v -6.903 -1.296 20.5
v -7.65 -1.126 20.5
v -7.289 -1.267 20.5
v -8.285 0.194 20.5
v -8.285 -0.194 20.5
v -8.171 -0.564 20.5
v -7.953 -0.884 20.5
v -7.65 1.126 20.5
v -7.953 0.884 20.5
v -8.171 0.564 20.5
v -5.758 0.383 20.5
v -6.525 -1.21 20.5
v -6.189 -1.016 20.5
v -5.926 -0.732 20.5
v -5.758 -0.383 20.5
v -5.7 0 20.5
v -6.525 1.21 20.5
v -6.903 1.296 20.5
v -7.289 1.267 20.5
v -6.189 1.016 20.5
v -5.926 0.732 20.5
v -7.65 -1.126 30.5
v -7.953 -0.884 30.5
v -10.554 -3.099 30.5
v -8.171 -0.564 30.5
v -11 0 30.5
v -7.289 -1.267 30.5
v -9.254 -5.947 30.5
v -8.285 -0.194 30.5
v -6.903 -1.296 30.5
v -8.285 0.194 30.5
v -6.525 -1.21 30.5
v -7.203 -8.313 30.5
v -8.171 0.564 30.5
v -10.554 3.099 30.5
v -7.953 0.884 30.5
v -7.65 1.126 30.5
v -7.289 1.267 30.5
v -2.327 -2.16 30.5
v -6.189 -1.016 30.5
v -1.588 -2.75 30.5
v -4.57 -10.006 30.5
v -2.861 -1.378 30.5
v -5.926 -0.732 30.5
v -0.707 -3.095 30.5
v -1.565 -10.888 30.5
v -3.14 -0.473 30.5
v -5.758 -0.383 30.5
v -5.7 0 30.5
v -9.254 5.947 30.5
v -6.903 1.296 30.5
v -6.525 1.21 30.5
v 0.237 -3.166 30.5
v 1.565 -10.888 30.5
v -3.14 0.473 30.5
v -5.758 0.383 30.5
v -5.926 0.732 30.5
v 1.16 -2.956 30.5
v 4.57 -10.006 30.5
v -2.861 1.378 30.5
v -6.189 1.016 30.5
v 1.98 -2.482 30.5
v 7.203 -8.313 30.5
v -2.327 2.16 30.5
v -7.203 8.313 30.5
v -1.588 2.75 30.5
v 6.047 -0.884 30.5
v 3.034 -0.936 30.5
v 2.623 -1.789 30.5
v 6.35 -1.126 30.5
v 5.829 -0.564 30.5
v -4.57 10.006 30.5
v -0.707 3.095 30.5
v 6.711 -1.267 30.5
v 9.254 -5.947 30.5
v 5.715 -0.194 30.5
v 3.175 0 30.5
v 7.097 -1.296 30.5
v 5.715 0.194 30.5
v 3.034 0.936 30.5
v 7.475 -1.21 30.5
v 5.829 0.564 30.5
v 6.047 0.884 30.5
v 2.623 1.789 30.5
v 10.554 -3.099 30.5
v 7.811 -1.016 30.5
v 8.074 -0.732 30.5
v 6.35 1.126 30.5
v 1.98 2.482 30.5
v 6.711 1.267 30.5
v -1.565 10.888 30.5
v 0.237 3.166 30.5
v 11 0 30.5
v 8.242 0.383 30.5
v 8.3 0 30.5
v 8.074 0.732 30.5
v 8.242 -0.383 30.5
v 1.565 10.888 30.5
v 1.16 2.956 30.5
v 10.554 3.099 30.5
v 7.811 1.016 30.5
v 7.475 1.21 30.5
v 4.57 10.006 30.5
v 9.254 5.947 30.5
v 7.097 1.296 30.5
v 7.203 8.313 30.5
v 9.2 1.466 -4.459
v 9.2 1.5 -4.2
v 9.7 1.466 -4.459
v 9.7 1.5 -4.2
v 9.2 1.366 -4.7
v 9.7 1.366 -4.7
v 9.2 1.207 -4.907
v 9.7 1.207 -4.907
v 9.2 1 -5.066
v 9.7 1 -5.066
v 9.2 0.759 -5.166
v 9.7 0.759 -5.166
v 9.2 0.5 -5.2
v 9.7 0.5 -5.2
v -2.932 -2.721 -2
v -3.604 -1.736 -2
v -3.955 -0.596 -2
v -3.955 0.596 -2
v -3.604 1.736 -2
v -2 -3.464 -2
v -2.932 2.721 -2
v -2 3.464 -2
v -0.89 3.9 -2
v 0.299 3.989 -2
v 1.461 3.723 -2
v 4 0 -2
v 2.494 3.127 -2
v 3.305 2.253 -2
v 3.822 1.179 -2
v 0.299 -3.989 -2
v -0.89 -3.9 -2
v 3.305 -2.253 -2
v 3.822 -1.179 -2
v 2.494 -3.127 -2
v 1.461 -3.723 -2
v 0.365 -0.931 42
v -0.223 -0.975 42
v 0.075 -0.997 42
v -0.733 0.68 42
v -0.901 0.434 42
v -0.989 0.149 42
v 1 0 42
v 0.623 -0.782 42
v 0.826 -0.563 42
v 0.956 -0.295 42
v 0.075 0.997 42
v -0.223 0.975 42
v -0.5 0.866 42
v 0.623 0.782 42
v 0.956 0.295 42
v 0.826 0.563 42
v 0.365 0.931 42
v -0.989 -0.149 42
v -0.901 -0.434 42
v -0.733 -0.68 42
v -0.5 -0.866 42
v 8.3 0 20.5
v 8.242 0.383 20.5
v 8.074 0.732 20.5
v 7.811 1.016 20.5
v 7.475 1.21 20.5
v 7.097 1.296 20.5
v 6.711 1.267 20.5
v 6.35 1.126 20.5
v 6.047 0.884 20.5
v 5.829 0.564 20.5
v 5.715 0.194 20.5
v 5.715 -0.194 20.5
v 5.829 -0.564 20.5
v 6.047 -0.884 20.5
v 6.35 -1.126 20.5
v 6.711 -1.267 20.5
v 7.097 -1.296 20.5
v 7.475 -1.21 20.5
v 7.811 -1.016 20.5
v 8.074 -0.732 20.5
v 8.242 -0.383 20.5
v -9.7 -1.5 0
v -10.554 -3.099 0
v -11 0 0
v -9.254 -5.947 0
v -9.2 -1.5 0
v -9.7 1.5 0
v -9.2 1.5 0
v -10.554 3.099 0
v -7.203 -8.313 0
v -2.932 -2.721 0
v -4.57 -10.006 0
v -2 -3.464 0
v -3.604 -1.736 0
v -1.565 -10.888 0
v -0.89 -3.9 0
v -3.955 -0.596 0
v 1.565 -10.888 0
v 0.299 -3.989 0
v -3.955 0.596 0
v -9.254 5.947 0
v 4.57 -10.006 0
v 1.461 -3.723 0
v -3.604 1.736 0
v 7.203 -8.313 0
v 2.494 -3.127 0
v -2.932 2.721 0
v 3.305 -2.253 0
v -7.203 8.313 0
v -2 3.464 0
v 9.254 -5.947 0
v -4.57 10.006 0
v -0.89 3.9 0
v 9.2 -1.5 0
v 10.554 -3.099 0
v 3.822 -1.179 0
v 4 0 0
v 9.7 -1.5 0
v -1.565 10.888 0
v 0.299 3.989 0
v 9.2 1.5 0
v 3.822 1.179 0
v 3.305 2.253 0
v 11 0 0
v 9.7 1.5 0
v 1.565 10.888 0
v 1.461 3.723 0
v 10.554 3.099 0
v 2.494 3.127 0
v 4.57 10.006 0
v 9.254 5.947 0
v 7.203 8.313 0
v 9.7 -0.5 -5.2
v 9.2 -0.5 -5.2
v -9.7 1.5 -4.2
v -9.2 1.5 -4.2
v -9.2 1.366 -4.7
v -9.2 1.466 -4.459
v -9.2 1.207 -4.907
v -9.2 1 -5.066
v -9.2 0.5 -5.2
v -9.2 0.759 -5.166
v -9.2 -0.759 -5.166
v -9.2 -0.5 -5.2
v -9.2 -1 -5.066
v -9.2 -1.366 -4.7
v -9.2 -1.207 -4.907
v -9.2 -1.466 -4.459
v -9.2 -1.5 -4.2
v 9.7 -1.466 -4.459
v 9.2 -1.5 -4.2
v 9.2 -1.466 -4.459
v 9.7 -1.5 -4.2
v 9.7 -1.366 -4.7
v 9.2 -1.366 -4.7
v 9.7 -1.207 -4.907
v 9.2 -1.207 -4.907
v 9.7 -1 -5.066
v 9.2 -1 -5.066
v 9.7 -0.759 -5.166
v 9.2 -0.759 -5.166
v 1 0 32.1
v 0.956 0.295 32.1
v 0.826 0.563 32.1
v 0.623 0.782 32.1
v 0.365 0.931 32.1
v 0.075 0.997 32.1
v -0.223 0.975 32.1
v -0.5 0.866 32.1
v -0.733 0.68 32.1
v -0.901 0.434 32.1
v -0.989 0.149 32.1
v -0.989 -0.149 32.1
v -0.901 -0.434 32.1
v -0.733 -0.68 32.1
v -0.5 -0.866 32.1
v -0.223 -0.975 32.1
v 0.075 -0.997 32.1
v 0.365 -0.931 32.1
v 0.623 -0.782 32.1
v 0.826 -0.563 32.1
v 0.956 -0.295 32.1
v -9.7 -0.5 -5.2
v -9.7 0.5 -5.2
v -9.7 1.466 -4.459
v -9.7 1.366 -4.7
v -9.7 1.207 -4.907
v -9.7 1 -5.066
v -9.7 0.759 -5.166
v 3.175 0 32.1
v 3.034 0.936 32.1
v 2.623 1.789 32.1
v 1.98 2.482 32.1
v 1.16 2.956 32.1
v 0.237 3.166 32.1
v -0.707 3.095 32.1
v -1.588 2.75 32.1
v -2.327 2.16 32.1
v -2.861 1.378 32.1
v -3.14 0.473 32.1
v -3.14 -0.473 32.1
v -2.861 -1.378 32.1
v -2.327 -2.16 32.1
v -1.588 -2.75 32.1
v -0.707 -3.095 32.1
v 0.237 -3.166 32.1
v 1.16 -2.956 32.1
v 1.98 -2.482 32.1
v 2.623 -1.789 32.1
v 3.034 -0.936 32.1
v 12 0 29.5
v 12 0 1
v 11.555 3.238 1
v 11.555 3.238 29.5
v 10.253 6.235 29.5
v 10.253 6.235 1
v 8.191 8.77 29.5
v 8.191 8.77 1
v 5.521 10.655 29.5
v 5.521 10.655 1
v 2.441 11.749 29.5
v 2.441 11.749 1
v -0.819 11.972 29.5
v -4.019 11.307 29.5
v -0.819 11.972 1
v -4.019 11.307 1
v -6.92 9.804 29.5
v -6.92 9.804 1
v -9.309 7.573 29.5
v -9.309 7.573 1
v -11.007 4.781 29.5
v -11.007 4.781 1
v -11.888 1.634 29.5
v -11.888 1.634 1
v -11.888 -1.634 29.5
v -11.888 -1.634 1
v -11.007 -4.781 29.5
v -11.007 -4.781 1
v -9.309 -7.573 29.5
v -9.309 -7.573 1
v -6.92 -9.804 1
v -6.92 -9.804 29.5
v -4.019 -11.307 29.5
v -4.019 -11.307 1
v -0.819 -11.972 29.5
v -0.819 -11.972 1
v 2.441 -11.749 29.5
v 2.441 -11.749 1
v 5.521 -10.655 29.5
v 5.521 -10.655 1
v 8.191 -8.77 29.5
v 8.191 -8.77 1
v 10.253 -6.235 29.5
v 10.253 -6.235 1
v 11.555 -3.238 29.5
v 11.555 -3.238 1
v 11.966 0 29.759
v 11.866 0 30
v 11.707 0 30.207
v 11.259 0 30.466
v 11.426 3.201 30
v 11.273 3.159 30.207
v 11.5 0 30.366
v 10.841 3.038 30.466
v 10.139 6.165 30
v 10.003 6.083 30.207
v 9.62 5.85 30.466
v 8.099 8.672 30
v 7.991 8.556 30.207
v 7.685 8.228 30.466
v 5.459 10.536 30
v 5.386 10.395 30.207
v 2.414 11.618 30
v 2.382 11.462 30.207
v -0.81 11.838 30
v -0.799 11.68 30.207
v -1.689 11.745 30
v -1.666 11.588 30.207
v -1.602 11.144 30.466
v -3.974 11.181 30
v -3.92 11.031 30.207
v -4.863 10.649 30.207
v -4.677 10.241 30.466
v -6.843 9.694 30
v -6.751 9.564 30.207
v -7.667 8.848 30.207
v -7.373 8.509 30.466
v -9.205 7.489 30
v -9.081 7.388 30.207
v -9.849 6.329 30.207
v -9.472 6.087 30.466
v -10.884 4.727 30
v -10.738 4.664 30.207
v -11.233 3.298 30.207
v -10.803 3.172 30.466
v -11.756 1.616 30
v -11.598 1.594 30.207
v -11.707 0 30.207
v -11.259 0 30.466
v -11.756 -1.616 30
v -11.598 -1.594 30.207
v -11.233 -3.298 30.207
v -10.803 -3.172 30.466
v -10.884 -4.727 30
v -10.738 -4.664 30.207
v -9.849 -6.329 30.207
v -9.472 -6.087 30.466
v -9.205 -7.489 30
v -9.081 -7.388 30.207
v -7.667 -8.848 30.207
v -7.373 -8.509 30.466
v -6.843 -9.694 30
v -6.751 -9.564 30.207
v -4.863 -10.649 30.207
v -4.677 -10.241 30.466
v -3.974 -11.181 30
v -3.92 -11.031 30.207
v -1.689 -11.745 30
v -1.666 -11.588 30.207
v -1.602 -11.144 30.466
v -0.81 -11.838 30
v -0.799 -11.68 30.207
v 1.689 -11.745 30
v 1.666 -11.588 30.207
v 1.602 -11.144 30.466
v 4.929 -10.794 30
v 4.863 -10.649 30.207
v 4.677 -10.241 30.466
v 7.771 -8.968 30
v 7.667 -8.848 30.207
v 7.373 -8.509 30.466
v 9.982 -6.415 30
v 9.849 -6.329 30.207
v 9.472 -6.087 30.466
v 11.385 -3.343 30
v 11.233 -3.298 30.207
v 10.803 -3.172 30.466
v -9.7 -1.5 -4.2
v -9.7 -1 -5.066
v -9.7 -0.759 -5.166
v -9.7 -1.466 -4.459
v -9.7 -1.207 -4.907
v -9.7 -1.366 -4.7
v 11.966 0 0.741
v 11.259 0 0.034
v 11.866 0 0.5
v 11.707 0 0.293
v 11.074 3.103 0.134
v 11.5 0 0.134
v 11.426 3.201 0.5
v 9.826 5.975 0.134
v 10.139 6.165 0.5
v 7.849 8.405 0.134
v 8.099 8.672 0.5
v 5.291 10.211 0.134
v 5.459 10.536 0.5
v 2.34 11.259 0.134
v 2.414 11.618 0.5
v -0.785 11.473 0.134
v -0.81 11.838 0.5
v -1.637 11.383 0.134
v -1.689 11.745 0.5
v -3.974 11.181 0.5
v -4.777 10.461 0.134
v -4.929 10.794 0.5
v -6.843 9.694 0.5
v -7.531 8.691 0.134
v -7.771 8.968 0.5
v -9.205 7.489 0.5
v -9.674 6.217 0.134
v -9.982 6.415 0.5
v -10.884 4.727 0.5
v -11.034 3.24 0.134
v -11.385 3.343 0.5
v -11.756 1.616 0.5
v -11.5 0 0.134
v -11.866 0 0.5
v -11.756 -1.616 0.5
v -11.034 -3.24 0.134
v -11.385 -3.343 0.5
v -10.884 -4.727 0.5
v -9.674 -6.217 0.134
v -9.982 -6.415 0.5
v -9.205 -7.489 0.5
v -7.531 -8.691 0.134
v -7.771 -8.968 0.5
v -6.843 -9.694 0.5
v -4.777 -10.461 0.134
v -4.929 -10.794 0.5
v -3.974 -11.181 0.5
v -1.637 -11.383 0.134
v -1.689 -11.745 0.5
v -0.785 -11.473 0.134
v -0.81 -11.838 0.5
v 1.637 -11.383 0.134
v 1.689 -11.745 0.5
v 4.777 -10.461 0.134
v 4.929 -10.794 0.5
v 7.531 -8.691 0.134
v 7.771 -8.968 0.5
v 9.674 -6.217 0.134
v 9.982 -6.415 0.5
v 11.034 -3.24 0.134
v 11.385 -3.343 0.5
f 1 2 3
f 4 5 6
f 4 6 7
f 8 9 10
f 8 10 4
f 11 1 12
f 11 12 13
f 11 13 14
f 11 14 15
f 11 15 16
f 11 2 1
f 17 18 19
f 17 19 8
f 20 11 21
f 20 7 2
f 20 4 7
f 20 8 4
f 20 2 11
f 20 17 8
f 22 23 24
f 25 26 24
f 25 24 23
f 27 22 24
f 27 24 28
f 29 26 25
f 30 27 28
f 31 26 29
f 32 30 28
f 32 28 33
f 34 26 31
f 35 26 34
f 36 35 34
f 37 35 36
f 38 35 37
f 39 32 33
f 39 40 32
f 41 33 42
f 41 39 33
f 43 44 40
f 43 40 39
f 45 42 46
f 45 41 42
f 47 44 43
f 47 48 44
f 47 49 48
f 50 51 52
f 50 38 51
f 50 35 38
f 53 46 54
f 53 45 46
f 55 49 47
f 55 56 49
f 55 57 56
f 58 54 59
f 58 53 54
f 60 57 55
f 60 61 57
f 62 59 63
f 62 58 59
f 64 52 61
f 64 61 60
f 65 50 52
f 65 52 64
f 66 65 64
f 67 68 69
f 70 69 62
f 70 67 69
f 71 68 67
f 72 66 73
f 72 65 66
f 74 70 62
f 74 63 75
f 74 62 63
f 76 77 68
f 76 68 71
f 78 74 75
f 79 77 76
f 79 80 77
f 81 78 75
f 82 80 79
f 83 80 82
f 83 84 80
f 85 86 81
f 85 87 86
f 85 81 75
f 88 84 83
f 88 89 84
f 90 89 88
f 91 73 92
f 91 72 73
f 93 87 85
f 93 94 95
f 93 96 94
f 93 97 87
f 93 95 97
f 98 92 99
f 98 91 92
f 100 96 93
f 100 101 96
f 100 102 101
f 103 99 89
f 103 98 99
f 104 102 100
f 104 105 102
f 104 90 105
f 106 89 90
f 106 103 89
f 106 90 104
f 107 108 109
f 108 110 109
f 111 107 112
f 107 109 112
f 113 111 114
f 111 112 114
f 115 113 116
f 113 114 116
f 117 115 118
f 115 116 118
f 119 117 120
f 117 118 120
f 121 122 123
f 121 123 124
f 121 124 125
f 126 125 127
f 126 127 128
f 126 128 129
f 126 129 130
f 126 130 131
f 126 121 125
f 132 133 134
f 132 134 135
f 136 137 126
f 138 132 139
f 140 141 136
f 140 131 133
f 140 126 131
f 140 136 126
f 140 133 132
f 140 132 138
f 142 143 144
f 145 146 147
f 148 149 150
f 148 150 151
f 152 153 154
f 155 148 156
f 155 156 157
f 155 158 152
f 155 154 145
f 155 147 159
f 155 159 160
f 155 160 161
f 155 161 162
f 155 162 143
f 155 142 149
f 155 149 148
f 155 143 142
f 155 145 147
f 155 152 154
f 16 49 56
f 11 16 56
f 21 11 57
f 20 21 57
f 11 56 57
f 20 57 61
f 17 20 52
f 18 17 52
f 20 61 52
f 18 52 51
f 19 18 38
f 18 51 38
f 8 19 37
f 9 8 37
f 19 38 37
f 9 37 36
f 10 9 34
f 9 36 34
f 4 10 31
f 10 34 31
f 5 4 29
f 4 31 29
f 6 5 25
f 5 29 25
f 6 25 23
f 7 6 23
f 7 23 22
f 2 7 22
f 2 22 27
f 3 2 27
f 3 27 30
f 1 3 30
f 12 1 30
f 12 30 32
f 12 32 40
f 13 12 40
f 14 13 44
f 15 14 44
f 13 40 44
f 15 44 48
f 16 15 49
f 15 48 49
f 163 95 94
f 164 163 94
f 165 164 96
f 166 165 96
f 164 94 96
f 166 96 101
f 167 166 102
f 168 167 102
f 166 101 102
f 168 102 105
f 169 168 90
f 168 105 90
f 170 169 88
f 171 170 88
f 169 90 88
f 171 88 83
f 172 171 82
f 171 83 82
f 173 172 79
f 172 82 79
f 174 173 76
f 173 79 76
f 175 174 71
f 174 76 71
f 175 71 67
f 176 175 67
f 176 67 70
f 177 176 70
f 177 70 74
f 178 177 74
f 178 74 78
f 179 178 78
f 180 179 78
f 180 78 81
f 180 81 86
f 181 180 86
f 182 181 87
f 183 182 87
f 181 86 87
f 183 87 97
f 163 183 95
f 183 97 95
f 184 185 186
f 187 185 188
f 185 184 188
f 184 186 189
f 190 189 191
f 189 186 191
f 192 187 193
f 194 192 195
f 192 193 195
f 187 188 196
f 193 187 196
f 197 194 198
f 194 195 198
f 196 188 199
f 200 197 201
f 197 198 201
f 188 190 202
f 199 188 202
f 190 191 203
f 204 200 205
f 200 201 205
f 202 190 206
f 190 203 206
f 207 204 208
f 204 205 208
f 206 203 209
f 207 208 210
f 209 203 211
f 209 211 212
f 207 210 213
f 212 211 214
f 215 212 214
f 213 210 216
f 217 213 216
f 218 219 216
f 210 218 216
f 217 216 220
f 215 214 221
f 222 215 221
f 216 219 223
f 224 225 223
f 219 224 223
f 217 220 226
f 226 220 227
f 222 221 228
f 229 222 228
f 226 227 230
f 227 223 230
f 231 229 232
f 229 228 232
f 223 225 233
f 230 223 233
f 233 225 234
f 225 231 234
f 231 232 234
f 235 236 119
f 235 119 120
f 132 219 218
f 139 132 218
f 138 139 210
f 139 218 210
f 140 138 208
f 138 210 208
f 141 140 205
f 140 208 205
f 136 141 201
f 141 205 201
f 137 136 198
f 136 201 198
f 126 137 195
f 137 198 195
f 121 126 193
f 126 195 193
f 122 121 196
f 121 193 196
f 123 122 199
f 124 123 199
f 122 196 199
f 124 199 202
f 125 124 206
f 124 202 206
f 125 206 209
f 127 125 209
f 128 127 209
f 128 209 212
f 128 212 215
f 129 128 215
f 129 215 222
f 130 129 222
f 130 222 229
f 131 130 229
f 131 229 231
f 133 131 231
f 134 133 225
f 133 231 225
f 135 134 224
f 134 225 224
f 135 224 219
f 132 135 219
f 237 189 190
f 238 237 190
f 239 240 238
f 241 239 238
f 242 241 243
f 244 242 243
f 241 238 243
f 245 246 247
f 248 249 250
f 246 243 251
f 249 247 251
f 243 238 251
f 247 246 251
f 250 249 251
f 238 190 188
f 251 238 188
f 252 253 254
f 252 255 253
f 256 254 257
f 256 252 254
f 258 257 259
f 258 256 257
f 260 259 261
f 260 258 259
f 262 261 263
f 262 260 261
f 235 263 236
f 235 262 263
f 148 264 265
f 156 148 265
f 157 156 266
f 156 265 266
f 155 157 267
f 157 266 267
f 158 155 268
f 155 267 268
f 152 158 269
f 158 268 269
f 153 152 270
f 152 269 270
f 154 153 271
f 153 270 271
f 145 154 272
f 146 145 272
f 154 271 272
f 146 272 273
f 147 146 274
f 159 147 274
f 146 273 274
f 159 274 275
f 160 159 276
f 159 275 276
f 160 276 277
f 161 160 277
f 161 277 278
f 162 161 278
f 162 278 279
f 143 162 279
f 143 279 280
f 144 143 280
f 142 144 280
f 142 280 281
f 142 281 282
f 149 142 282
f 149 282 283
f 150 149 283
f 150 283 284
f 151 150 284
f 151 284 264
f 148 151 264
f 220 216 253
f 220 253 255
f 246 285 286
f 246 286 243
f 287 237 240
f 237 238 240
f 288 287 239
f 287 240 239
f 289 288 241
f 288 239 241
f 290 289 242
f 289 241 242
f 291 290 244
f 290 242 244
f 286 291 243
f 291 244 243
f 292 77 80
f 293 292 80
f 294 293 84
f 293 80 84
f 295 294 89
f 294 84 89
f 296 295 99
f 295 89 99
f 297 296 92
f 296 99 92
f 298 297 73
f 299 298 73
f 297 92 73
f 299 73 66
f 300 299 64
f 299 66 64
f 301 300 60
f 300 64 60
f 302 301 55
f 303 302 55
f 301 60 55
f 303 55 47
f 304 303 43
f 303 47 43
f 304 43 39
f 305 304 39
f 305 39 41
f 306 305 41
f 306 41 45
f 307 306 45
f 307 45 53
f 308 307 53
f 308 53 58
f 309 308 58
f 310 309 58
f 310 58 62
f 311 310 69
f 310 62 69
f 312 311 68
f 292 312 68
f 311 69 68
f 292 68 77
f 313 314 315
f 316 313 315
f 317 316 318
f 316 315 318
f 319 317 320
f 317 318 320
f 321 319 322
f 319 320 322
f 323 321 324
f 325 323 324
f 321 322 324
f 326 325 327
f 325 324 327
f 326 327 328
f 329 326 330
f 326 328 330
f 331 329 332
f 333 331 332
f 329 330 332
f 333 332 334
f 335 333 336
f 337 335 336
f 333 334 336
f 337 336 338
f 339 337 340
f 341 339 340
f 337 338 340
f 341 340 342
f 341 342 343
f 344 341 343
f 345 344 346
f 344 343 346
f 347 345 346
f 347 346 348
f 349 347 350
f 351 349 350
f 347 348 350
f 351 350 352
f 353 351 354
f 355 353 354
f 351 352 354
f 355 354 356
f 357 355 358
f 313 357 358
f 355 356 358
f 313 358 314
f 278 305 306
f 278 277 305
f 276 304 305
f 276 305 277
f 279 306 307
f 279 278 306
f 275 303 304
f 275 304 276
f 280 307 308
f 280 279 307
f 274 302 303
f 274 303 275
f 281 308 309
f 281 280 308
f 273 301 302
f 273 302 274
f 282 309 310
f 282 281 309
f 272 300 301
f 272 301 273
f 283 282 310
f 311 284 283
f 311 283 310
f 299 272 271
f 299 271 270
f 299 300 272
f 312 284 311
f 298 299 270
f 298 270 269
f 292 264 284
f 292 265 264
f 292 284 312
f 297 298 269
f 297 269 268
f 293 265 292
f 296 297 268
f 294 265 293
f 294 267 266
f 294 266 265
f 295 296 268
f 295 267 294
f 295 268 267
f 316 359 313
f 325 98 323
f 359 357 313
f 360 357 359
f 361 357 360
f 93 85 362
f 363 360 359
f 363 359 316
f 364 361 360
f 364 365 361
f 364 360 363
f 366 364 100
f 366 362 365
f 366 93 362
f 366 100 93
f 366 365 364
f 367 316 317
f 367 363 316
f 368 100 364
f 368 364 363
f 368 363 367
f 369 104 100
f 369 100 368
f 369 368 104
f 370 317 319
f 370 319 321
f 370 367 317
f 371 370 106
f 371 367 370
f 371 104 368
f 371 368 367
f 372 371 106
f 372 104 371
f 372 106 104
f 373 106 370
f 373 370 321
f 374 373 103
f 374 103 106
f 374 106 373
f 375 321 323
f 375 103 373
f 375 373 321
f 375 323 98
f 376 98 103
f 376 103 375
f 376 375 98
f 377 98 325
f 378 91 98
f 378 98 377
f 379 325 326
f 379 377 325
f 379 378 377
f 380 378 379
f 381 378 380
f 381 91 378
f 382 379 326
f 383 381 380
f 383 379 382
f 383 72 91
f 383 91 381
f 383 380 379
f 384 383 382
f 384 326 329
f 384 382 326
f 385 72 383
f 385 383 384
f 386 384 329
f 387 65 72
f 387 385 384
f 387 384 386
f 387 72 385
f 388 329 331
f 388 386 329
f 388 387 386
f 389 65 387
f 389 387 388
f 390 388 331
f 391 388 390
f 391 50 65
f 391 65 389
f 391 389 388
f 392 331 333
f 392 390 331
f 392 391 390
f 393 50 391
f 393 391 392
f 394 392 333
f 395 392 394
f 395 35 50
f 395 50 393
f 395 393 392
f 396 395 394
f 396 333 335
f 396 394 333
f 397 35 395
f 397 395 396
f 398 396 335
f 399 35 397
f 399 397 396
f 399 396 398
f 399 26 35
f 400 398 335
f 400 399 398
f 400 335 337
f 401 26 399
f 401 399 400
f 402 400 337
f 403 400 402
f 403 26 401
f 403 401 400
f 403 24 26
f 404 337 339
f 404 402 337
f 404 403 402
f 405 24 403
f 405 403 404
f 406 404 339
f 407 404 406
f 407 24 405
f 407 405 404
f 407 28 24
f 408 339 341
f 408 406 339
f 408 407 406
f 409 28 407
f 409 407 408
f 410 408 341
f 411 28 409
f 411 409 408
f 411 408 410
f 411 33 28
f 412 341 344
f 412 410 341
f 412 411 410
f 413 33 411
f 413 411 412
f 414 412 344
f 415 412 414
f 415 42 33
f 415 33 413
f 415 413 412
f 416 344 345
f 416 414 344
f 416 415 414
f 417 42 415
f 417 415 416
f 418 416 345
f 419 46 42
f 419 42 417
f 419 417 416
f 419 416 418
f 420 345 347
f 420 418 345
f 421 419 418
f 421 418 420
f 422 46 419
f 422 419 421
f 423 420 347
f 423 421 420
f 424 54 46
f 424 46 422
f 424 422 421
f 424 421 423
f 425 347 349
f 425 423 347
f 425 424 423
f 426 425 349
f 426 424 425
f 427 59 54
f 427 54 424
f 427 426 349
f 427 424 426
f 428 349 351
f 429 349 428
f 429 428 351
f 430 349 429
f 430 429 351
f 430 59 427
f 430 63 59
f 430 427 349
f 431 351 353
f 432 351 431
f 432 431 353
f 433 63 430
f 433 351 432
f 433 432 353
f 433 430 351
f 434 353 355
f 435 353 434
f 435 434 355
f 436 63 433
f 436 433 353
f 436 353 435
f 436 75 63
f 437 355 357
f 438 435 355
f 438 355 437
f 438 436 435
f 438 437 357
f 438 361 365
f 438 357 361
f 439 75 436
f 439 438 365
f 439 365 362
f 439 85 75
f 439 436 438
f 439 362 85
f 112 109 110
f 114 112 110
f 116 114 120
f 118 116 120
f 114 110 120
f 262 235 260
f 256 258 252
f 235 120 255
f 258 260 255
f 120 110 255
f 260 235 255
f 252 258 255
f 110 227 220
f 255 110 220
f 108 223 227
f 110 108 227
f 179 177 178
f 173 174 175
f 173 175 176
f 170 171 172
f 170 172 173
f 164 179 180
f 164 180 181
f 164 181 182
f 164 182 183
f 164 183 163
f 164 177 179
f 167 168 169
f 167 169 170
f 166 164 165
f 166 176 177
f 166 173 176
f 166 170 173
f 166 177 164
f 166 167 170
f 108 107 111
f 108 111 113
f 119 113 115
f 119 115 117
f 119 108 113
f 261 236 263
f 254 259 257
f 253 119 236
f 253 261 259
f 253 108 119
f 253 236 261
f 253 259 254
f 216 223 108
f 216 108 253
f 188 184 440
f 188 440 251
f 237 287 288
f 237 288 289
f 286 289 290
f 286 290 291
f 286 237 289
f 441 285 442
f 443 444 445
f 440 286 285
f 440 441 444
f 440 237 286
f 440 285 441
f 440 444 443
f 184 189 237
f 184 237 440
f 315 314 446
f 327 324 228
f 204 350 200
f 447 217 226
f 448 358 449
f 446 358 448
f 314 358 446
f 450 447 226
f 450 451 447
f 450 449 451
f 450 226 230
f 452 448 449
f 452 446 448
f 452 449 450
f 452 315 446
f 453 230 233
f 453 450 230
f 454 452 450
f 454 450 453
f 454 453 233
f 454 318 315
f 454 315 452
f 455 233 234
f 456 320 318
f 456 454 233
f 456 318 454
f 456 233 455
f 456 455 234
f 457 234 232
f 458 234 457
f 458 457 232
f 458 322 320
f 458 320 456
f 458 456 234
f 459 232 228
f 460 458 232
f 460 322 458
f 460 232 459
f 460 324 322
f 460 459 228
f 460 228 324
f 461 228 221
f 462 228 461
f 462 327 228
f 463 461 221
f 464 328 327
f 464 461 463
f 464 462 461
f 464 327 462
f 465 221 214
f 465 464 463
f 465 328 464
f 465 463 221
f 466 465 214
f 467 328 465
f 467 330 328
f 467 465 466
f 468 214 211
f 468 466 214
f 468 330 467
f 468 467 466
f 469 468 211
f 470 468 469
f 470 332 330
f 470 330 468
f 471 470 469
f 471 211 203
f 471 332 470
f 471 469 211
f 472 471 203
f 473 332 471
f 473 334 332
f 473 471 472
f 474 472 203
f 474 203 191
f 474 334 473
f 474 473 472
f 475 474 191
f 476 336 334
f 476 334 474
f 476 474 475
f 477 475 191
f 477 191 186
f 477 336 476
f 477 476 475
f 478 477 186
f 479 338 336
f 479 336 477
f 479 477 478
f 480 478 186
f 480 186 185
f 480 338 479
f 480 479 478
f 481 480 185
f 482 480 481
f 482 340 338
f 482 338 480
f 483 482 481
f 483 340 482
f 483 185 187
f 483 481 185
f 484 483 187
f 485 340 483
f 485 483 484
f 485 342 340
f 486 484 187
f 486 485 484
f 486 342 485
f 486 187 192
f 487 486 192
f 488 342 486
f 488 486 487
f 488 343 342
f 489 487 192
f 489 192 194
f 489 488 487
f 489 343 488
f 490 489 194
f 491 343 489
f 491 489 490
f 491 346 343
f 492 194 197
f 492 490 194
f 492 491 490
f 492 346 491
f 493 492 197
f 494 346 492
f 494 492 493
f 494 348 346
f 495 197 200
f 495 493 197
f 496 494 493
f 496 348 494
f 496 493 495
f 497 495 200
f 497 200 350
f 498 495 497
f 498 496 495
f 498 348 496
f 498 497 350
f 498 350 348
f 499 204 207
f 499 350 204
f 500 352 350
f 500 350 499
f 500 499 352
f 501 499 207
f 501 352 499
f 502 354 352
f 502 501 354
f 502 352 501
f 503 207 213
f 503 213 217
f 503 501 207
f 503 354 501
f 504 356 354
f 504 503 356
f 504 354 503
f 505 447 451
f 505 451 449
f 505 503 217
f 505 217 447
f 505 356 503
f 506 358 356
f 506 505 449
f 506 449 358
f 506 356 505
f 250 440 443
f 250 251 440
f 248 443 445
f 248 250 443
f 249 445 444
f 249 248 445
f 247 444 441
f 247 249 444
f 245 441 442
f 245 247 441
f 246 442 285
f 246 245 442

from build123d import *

# Parameters (mm, degrees)
F0_R      = 12
F1_DEPTH  = 30.5
F2_R      = 1
F3_DEPTH  = 11.5
F4_R      = 3.175
F5_DEPTH  = 1.6
F6_R      = 1.3
F7_DEPTH  = 10
F8_R      = 4
F9_DEPTH  = 2
F10_W     = 0.5
F10_H     = 3
F11_DEPTH = 5.2
F12_R     = 1
F13_R     = 1
F14_R     = 1


with BuildPart() as f1:
    # F0 (on Top) → F1 (new body)
    with BuildSketch(Plane.XY):
        Circle(F0_R)
    extrude(amount=F1_DEPTH)

    # F2 (on face) → F3 (join)
    with BuildSketch(Plane.XY.offset(30.5)):
        Circle(F2_R)
    extrude(amount=F3_DEPTH)

    # F4 (on face) → F5 (join)
    with BuildSketch(Plane.XY.offset(30.5)):
        Circle(F4_R)
    extrude(amount=F5_DEPTH)

    # F6 (on face) → F7 (cut)
    with BuildSketch(Plane.XY.offset(30.5)):
        with Locations((-7, 0)):
            Circle(F6_R)
        with Locations((7, 0)):
            Circle(F6_R)
    extrude(amount=-F7_DEPTH, mode=Mode.SUBTRACT)

    # F8 (on face) → F9 (join)
    with BuildSketch(Plane(origin=(0, 0, 0), x_dir=(1, 0, 0), z_dir=(0, 0, -1))):
        Circle(F8_R)
    extrude(amount=F9_DEPTH)

    # F10 (on face) → F11 (join)
    with BuildSketch(Plane(origin=(0, 0, 0), x_dir=(1, 0, 0), z_dir=(0, 0, -1))):
        with Locations((-9.45, 0)):
            Rectangle(F10_W, F10_H)
        with Locations((9.45, 0)):
            Rectangle(F10_W, F10_H)
    extrude(amount=F11_DEPTH)

    # F12
    f12_edges = [f1.edges().sort_by_distance(p)[0] for p in [
        (-9.45, 1.5, -5.2),
        (-9.45, -1.5, -5.2),
        (9.45, 1.5, -5.2),
        (9.45, -1.5, -5.2),
    ]]
    fillet(f12_edges, radius=F12_R)

    # F13
    f13_edges = [f1.edges().sort_by_distance(p)[0] for p in [
        (-12, 0, 0),
    ]]
    fillet(f13_edges, radius=F13_R)

    # F14
    f14_edges = [f1.edges().sort_by_distance(p)[0] for p in [
        (-12, 0, 30.5),
    ]]
    fillet(f14_edges, radius=F14_R)


solid = f1.part
